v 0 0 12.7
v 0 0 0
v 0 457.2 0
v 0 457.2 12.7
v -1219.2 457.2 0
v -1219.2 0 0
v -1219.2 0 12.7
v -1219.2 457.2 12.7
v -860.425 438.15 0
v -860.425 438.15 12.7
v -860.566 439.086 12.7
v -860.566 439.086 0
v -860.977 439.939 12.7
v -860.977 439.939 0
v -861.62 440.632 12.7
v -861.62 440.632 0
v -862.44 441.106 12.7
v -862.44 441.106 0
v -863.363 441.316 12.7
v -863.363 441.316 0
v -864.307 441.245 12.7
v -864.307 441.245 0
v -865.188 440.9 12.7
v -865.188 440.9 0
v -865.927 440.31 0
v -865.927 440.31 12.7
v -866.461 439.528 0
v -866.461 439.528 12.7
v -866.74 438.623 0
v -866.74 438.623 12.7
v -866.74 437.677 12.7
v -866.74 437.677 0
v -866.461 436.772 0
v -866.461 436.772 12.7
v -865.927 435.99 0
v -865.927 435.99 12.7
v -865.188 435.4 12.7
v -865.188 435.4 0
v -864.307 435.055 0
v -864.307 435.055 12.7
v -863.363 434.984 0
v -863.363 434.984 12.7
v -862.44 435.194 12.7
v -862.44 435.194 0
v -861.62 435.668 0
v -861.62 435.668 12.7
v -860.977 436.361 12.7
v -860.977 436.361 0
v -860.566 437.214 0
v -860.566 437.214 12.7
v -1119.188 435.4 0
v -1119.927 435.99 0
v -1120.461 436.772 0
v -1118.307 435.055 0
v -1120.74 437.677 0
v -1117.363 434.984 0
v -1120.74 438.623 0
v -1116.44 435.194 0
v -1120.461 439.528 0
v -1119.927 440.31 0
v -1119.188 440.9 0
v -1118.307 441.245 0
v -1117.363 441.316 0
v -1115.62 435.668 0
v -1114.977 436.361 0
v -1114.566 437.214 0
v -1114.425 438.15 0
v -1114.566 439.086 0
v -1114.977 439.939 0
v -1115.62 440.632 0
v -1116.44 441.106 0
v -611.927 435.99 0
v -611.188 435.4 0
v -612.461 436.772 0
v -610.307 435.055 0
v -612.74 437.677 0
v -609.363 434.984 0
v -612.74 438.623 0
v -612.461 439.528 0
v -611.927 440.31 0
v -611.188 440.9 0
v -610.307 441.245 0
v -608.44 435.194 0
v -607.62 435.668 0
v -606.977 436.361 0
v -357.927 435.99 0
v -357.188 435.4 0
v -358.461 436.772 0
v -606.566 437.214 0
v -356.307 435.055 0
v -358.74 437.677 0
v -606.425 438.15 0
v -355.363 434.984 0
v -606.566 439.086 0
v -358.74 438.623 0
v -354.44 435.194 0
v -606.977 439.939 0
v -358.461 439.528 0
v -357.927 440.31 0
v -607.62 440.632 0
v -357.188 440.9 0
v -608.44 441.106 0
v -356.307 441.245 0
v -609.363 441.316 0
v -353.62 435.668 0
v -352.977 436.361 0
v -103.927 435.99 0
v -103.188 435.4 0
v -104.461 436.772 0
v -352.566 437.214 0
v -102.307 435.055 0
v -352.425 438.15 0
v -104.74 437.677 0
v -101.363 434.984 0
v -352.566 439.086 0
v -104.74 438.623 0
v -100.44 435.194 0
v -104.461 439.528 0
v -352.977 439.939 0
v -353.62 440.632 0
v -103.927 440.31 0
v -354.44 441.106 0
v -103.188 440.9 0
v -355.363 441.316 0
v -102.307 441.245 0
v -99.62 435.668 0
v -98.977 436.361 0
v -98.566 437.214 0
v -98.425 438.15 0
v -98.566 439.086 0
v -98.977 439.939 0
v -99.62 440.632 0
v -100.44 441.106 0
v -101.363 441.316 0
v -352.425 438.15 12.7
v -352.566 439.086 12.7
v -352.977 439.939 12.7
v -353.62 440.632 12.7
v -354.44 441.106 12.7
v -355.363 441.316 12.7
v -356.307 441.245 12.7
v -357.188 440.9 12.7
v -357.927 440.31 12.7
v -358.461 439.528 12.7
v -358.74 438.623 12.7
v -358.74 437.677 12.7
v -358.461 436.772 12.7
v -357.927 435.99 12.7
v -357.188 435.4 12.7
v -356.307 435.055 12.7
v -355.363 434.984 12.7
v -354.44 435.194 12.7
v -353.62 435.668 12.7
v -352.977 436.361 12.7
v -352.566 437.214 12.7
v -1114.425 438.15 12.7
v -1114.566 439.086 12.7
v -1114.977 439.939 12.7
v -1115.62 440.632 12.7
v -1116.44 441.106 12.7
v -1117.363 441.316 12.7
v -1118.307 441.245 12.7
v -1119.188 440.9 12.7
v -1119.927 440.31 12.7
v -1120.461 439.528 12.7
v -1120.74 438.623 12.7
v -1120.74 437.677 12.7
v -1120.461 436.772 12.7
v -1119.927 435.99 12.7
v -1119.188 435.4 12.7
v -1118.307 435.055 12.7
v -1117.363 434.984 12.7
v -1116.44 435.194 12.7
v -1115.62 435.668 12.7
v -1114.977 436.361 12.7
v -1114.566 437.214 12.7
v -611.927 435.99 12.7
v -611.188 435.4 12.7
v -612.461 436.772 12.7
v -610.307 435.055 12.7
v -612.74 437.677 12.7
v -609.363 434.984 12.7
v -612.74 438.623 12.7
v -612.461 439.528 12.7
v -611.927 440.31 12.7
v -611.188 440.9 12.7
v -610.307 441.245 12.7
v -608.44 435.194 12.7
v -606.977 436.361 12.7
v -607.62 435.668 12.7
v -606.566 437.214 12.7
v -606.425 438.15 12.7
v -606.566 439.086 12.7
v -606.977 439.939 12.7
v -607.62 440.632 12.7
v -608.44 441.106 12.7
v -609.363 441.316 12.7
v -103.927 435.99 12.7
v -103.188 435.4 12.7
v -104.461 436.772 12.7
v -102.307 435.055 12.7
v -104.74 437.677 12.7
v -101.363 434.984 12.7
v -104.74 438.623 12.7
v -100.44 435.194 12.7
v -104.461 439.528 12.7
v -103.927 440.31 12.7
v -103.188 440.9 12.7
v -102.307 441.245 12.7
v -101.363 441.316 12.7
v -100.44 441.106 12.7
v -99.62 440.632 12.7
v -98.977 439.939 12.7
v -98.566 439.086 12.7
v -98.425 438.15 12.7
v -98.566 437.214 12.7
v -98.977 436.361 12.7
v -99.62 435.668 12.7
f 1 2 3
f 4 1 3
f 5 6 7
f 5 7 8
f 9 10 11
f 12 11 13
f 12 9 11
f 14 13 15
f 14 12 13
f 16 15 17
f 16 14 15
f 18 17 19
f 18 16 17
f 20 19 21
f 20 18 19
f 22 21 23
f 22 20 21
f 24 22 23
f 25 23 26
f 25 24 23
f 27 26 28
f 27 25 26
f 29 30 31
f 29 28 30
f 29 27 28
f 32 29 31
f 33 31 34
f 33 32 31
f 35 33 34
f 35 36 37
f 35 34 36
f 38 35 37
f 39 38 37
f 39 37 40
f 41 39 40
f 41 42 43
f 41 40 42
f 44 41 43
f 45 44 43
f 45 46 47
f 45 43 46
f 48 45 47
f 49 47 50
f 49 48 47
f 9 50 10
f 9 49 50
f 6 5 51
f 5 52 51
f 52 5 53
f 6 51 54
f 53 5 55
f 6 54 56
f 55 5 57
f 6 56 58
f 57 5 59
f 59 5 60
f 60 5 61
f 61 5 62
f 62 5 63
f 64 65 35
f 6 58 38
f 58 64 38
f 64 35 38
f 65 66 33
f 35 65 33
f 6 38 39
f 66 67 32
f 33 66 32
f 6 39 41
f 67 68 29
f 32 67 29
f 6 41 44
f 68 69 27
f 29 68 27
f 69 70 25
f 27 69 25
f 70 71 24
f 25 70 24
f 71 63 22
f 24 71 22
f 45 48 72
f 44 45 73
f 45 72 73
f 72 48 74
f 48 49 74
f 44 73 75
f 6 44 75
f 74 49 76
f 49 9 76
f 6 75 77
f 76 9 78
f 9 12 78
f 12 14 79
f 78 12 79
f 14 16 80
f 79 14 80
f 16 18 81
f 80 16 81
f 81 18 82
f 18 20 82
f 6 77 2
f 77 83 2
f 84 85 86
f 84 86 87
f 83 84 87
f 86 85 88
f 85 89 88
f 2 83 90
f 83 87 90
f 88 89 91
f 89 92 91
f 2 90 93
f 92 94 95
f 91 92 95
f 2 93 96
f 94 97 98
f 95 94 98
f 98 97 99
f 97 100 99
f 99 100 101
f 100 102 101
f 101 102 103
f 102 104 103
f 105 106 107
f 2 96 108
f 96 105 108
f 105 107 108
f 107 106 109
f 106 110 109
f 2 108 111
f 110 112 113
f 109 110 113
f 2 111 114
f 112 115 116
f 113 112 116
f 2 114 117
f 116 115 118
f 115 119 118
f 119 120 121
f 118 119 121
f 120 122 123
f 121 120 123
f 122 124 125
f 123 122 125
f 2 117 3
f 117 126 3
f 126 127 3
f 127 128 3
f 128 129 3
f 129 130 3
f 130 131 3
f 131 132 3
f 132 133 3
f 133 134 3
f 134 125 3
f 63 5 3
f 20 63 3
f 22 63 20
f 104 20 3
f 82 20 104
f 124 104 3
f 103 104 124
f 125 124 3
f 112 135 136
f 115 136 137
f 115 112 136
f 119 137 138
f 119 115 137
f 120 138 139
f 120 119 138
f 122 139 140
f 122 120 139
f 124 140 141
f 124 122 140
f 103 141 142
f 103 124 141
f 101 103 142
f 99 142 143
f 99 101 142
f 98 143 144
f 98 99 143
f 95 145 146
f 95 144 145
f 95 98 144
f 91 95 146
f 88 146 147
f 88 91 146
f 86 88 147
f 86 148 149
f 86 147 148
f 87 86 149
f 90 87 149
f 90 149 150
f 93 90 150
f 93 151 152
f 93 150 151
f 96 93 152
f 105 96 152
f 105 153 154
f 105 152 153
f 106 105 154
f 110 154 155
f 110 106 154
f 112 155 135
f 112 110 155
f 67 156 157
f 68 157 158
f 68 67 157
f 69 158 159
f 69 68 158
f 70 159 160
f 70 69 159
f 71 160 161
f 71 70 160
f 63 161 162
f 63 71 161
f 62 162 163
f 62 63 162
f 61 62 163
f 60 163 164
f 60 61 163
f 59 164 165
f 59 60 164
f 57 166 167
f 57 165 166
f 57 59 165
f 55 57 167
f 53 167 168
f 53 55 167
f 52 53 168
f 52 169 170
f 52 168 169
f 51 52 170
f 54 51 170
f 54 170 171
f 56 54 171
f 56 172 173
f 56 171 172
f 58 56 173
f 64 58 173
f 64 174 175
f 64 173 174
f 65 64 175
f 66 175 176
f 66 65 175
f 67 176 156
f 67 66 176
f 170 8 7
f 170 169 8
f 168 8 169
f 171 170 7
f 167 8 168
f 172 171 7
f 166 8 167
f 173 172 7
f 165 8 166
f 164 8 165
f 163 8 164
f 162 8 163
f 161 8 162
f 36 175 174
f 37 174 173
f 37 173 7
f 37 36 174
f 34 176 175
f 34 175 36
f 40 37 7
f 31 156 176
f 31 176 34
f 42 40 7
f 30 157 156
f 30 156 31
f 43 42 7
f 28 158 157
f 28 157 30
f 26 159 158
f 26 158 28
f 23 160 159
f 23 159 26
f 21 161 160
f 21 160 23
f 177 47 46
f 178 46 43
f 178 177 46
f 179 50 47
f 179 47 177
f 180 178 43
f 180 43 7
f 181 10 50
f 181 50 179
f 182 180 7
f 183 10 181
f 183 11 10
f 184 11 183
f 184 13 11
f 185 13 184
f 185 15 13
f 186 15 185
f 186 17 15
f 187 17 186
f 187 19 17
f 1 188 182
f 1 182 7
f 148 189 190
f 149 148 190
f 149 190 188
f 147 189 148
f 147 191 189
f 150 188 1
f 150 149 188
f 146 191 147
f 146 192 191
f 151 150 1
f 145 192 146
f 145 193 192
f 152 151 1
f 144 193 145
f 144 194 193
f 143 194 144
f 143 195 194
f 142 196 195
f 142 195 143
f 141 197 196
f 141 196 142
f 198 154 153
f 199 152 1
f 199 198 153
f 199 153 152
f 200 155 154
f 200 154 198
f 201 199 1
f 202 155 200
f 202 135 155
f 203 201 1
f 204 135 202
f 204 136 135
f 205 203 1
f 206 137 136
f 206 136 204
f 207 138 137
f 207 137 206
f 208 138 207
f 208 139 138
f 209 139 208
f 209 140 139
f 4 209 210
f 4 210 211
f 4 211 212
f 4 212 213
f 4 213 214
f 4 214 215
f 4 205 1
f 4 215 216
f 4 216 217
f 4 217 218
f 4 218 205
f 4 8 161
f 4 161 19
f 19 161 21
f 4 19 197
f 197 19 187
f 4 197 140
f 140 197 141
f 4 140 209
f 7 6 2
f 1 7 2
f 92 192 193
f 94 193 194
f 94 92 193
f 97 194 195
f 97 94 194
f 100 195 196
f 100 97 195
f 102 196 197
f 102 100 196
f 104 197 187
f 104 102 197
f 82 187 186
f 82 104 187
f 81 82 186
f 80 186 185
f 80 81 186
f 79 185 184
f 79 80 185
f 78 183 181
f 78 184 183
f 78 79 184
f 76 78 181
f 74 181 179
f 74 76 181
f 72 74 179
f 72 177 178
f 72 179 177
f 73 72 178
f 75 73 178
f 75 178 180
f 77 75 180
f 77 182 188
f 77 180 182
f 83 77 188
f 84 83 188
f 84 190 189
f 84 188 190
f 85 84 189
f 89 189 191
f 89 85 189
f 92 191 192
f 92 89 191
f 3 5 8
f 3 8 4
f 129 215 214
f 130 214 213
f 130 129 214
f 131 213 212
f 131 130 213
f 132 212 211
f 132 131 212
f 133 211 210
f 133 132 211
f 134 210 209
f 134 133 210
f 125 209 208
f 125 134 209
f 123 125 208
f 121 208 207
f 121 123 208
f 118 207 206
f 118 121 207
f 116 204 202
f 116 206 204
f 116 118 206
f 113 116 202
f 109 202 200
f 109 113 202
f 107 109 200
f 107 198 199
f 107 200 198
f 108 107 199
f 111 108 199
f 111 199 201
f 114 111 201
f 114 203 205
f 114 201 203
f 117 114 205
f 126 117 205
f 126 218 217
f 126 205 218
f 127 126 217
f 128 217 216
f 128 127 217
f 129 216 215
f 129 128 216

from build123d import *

# Parameters (mm, degrees)
SKETCH1_W           = 1219.2
SKETCH1_H           = 457.2
BOSS_EXTRUDE1_DEPTH = 12.7
SKETCH2_R           = 3.175
CUT_EXTRUDE1_DEPTH  = 1303.168103587


with BuildPart() as part:
    # Sketch1 → Boss-Extrude1 (new body)
    with BuildSketch(Plane.XY):
        with Locations((-609.6, 228.6)):
            Rectangle(SKETCH1_W, SKETCH1_H)
    extrude(amount=BOSS_EXTRUDE1_DEPTH)

    # Sketch2 (on Front Plane) → Cut-Extrude1 (cut, through all)
    with BuildSketch(Plane.XY):
        with Locations((-1117.6, 438.15)):
            Circle(SKETCH2_R)
        with Locations((-863.6, 438.15)):
            Circle(SKETCH2_R)
        with Locations((-609.6, 438.15)):
            Circle(SKETCH2_R)
        with Locations((-355.6, 438.15)):
            Circle(SKETCH2_R)
        with Locations((-101.6, 438.15)):
            Circle(SKETCH2_R)
    extrude(amount=CUT_EXTRUDE1_DEPTH, mode=Mode.SUBTRACT)


solid = part.part
